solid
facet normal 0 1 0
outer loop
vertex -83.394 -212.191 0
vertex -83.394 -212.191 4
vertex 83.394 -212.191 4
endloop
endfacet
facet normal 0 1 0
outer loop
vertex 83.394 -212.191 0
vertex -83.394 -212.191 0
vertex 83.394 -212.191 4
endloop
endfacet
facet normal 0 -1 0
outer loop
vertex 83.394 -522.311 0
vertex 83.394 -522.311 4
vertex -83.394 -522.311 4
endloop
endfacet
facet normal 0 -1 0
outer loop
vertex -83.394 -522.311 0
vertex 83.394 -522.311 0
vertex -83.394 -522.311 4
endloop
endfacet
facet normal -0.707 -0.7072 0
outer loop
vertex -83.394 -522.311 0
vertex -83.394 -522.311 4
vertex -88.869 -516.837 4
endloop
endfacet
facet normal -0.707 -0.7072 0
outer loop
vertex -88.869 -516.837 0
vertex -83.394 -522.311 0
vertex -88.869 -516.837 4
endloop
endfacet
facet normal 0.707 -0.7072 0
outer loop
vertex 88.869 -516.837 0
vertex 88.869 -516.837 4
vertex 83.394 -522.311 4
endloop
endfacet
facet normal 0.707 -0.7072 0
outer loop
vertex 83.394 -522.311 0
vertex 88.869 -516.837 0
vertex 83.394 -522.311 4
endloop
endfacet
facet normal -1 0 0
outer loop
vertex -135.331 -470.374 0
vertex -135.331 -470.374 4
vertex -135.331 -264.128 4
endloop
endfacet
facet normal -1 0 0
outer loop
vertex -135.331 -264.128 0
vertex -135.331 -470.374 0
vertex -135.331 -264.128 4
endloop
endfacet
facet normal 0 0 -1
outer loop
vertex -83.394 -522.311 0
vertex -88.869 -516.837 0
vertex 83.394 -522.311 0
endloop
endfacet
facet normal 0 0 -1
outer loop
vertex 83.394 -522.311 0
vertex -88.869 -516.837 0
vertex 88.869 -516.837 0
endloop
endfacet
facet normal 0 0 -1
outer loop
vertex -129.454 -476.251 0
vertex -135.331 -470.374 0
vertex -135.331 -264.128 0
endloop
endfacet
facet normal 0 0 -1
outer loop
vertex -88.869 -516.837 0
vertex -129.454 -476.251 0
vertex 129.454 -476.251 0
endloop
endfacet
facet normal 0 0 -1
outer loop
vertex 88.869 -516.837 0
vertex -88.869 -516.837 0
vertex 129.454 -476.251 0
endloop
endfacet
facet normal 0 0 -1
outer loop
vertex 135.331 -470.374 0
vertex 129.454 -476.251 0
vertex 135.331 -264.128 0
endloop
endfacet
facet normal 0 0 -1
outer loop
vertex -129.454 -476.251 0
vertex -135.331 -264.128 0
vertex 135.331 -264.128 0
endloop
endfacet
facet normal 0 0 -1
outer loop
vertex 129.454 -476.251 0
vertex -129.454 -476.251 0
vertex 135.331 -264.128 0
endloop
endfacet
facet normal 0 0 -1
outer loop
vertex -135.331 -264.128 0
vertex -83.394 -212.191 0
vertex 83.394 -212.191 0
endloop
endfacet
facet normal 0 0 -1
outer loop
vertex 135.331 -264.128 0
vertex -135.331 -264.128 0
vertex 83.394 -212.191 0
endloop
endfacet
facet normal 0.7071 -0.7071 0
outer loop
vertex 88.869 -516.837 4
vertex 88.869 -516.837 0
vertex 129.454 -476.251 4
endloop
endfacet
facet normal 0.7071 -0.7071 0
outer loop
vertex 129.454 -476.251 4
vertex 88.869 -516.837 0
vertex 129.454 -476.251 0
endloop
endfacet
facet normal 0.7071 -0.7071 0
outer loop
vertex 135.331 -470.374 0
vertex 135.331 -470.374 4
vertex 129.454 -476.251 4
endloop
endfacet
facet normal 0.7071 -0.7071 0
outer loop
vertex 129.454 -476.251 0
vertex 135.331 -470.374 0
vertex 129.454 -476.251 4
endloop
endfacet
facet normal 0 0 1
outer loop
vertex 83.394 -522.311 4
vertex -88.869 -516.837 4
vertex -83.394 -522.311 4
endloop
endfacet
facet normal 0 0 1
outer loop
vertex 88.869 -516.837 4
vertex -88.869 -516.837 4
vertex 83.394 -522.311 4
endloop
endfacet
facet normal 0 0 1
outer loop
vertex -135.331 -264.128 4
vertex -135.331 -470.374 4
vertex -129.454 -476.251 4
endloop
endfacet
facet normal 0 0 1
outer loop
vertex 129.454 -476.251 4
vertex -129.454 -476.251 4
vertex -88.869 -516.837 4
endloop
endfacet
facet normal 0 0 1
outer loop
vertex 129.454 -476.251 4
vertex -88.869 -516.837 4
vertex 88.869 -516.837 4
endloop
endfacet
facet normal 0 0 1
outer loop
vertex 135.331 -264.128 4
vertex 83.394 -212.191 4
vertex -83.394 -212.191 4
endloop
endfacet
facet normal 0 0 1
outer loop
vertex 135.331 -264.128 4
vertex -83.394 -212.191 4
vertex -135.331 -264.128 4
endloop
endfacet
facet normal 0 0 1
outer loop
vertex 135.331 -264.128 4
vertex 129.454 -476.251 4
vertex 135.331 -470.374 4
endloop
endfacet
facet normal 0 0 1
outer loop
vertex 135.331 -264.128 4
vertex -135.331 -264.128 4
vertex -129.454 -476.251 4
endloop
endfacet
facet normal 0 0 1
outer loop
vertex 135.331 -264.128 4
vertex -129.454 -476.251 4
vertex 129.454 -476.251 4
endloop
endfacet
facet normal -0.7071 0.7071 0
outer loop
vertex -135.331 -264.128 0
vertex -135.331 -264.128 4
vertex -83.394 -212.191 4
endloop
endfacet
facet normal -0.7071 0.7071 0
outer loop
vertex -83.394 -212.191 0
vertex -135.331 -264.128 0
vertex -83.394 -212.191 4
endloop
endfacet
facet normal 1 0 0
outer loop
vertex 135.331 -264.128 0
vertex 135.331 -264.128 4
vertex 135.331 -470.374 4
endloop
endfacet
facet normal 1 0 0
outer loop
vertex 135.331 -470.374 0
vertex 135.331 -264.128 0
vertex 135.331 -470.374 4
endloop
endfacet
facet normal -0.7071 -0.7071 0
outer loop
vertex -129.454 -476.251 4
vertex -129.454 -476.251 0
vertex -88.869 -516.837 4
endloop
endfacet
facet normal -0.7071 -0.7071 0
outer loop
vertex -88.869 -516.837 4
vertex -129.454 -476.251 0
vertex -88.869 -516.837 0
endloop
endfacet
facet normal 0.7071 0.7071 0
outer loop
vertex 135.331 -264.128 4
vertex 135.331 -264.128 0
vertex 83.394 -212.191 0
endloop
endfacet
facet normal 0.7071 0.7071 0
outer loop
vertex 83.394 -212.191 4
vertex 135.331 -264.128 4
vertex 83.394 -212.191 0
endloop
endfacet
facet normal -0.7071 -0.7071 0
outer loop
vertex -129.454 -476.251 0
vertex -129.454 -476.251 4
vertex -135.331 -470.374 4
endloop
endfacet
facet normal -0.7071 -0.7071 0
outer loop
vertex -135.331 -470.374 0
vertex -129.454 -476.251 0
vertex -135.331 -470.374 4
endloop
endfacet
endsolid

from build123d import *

# Parameters (mm, degrees)
BOSS_EXTRUDE1_DEPTH = 4
SKETCH2_W           = 429.121378383
SKETCH2_H           = 424.720133477
CUT_EXTRUDE1_DEPTH  = 10


with BuildPart() as part:
    # Sketch1 → Boss-Extrude1 (new body)
    with BuildSketch(Plane.XY):
        Polygon((88.868642116, -197.391367321), (-88.868642116, -197.391367321), (-88.868642116, -217.665581629), (-129.454428553, -258.251368066), (-150.131357884, -258.251368066), (-150.131357884, -476.251366576), (-129.454428553, -476.251366576), (-88.868642116, -516.837153014), (-88.868642116, -537.111367321), (88.868642116, -537.111367321), (88.868642116, -516.837153014), (129.454428553, -476.251366576), (150.131357884, -476.251366576), (150.131357884, -258.251368066), (129.454428553, -258.251368066), (88.868642116, -217.665581629), align=None)
    extrude(amount=BOSS_EXTRUDE1_DEPTH)

    # Sketch2 → Cut-Extrude1 (cut)
    with BuildSketch(Plane.XY.offset(4)):
        with Locations((25.344127001, -373.74675893)):
            Rectangle(SKETCH2_W, SKETCH2_H)
        Polygon((-83.394427808, -212.191367321), (83.394427808, -212.191367321), (135.331357884, -264.128297397), (135.331357884, -470.374437245), (83.394427808, -522.311367321), (-83.394427808, -522.311367321), (-135.331357884, -470.374437245), (-135.331357884, -264.128297397), align=None, mode=Mode.SUBTRACT)
    extrude(amount=-CUT_EXTRUDE1_DEPTH, mode=Mode.SUBTRACT)


solid = part.part
